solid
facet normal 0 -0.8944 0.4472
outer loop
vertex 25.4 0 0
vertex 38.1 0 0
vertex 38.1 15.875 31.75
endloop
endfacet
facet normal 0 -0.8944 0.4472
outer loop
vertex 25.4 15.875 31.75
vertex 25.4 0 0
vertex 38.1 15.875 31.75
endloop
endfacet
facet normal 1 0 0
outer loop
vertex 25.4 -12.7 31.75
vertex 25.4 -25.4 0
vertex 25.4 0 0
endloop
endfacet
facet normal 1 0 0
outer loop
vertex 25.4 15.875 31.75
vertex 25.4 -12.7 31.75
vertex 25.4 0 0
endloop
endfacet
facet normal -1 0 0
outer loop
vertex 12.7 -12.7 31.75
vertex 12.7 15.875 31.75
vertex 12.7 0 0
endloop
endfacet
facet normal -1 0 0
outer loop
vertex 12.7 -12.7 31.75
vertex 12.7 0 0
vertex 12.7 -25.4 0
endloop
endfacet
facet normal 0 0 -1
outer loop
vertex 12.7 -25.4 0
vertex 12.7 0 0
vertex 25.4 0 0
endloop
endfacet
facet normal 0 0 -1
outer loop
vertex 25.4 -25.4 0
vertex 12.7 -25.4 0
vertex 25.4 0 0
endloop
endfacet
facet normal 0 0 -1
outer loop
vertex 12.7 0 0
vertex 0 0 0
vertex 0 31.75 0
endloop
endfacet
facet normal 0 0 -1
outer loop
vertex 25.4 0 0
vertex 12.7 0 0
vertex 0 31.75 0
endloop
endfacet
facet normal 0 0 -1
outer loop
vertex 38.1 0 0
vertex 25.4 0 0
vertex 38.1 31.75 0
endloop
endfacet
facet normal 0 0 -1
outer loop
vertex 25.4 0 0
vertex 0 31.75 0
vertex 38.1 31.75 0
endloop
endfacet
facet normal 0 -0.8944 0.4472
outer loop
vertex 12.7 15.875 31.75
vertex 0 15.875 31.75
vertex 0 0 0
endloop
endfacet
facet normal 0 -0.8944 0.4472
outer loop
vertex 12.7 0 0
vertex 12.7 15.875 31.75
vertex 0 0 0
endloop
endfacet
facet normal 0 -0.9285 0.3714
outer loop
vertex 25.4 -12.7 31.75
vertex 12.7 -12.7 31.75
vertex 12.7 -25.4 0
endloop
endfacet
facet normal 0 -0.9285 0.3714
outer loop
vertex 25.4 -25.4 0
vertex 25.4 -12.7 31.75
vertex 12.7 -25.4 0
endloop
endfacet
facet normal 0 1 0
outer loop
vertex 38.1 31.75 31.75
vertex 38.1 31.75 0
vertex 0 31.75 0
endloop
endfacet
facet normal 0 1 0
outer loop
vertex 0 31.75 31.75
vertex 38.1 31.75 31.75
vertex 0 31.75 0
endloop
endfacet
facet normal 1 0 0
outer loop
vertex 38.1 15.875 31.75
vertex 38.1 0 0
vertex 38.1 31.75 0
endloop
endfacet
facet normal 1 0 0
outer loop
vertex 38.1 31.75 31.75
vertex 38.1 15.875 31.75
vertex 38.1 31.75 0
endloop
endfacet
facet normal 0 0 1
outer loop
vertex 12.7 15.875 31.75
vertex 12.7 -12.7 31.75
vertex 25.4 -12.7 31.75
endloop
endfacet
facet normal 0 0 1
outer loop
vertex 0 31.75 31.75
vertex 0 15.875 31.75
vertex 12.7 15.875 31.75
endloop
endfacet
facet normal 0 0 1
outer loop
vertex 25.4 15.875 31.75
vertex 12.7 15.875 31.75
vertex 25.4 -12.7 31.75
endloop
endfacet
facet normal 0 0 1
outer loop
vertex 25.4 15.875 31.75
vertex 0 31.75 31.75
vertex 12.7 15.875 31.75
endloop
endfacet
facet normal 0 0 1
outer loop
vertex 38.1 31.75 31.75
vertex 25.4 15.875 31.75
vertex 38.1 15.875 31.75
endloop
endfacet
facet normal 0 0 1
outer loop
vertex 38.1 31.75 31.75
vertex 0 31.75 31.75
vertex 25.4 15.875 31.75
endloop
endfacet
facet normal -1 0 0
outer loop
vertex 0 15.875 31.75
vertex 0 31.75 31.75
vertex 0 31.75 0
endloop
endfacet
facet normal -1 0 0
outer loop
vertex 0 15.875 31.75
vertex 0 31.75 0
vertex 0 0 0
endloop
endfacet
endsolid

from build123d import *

# Parameters (mm, degrees)
F1_DEPTH = 31.75
F3_DEPTH = 25.4
F5_DEPTH = 12.7
F7_DEPTH = 12.7


with BuildPart() as f1:
    # F0 (on Top) → F1 (new body)
    with BuildSketch(Plane.XY):
        Polygon((0, 31.75), (0, 0), (12.7, 0), (12.7, -25.4), (25.4, -25.4), (25.4, 0), (38.1, 0), (38.1, 31.75), align=None)
    extrude(amount=F1_DEPTH)

    # F2 (on face) → F3 (cut)
    with BuildSketch(Plane(origin=(12.7, 0, 0), x_dir=(0, -1, 0), z_dir=(-1, 0, 0))):
        Polygon((25.4, 31.75), (12.7, 31.75), (25.4, 0), align=None)
    extrude(amount=-F3_DEPTH, mode=Mode.SUBTRACT)

    # F4 (on face) → F5 (cut)
    with BuildSketch(Plane(origin=(0, 0, 0), x_dir=(0, -1, 0), z_dir=(-1, 0, 0))):
        Polygon((0, 31.75), (-15.875, 31.75), (0, 0), align=None)
    extrude(amount=-F5_DEPTH, mode=Mode.SUBTRACT)

    # F6 (on face) → F7 (cut)
    with BuildSketch(Plane.YZ.offset(38.1)):
        Polygon((0, 0), (15.875, 31.75), (0, 31.75), align=None)
    extrude(amount=-F7_DEPTH, mode=Mode.SUBTRACT)


solid = f1.part
